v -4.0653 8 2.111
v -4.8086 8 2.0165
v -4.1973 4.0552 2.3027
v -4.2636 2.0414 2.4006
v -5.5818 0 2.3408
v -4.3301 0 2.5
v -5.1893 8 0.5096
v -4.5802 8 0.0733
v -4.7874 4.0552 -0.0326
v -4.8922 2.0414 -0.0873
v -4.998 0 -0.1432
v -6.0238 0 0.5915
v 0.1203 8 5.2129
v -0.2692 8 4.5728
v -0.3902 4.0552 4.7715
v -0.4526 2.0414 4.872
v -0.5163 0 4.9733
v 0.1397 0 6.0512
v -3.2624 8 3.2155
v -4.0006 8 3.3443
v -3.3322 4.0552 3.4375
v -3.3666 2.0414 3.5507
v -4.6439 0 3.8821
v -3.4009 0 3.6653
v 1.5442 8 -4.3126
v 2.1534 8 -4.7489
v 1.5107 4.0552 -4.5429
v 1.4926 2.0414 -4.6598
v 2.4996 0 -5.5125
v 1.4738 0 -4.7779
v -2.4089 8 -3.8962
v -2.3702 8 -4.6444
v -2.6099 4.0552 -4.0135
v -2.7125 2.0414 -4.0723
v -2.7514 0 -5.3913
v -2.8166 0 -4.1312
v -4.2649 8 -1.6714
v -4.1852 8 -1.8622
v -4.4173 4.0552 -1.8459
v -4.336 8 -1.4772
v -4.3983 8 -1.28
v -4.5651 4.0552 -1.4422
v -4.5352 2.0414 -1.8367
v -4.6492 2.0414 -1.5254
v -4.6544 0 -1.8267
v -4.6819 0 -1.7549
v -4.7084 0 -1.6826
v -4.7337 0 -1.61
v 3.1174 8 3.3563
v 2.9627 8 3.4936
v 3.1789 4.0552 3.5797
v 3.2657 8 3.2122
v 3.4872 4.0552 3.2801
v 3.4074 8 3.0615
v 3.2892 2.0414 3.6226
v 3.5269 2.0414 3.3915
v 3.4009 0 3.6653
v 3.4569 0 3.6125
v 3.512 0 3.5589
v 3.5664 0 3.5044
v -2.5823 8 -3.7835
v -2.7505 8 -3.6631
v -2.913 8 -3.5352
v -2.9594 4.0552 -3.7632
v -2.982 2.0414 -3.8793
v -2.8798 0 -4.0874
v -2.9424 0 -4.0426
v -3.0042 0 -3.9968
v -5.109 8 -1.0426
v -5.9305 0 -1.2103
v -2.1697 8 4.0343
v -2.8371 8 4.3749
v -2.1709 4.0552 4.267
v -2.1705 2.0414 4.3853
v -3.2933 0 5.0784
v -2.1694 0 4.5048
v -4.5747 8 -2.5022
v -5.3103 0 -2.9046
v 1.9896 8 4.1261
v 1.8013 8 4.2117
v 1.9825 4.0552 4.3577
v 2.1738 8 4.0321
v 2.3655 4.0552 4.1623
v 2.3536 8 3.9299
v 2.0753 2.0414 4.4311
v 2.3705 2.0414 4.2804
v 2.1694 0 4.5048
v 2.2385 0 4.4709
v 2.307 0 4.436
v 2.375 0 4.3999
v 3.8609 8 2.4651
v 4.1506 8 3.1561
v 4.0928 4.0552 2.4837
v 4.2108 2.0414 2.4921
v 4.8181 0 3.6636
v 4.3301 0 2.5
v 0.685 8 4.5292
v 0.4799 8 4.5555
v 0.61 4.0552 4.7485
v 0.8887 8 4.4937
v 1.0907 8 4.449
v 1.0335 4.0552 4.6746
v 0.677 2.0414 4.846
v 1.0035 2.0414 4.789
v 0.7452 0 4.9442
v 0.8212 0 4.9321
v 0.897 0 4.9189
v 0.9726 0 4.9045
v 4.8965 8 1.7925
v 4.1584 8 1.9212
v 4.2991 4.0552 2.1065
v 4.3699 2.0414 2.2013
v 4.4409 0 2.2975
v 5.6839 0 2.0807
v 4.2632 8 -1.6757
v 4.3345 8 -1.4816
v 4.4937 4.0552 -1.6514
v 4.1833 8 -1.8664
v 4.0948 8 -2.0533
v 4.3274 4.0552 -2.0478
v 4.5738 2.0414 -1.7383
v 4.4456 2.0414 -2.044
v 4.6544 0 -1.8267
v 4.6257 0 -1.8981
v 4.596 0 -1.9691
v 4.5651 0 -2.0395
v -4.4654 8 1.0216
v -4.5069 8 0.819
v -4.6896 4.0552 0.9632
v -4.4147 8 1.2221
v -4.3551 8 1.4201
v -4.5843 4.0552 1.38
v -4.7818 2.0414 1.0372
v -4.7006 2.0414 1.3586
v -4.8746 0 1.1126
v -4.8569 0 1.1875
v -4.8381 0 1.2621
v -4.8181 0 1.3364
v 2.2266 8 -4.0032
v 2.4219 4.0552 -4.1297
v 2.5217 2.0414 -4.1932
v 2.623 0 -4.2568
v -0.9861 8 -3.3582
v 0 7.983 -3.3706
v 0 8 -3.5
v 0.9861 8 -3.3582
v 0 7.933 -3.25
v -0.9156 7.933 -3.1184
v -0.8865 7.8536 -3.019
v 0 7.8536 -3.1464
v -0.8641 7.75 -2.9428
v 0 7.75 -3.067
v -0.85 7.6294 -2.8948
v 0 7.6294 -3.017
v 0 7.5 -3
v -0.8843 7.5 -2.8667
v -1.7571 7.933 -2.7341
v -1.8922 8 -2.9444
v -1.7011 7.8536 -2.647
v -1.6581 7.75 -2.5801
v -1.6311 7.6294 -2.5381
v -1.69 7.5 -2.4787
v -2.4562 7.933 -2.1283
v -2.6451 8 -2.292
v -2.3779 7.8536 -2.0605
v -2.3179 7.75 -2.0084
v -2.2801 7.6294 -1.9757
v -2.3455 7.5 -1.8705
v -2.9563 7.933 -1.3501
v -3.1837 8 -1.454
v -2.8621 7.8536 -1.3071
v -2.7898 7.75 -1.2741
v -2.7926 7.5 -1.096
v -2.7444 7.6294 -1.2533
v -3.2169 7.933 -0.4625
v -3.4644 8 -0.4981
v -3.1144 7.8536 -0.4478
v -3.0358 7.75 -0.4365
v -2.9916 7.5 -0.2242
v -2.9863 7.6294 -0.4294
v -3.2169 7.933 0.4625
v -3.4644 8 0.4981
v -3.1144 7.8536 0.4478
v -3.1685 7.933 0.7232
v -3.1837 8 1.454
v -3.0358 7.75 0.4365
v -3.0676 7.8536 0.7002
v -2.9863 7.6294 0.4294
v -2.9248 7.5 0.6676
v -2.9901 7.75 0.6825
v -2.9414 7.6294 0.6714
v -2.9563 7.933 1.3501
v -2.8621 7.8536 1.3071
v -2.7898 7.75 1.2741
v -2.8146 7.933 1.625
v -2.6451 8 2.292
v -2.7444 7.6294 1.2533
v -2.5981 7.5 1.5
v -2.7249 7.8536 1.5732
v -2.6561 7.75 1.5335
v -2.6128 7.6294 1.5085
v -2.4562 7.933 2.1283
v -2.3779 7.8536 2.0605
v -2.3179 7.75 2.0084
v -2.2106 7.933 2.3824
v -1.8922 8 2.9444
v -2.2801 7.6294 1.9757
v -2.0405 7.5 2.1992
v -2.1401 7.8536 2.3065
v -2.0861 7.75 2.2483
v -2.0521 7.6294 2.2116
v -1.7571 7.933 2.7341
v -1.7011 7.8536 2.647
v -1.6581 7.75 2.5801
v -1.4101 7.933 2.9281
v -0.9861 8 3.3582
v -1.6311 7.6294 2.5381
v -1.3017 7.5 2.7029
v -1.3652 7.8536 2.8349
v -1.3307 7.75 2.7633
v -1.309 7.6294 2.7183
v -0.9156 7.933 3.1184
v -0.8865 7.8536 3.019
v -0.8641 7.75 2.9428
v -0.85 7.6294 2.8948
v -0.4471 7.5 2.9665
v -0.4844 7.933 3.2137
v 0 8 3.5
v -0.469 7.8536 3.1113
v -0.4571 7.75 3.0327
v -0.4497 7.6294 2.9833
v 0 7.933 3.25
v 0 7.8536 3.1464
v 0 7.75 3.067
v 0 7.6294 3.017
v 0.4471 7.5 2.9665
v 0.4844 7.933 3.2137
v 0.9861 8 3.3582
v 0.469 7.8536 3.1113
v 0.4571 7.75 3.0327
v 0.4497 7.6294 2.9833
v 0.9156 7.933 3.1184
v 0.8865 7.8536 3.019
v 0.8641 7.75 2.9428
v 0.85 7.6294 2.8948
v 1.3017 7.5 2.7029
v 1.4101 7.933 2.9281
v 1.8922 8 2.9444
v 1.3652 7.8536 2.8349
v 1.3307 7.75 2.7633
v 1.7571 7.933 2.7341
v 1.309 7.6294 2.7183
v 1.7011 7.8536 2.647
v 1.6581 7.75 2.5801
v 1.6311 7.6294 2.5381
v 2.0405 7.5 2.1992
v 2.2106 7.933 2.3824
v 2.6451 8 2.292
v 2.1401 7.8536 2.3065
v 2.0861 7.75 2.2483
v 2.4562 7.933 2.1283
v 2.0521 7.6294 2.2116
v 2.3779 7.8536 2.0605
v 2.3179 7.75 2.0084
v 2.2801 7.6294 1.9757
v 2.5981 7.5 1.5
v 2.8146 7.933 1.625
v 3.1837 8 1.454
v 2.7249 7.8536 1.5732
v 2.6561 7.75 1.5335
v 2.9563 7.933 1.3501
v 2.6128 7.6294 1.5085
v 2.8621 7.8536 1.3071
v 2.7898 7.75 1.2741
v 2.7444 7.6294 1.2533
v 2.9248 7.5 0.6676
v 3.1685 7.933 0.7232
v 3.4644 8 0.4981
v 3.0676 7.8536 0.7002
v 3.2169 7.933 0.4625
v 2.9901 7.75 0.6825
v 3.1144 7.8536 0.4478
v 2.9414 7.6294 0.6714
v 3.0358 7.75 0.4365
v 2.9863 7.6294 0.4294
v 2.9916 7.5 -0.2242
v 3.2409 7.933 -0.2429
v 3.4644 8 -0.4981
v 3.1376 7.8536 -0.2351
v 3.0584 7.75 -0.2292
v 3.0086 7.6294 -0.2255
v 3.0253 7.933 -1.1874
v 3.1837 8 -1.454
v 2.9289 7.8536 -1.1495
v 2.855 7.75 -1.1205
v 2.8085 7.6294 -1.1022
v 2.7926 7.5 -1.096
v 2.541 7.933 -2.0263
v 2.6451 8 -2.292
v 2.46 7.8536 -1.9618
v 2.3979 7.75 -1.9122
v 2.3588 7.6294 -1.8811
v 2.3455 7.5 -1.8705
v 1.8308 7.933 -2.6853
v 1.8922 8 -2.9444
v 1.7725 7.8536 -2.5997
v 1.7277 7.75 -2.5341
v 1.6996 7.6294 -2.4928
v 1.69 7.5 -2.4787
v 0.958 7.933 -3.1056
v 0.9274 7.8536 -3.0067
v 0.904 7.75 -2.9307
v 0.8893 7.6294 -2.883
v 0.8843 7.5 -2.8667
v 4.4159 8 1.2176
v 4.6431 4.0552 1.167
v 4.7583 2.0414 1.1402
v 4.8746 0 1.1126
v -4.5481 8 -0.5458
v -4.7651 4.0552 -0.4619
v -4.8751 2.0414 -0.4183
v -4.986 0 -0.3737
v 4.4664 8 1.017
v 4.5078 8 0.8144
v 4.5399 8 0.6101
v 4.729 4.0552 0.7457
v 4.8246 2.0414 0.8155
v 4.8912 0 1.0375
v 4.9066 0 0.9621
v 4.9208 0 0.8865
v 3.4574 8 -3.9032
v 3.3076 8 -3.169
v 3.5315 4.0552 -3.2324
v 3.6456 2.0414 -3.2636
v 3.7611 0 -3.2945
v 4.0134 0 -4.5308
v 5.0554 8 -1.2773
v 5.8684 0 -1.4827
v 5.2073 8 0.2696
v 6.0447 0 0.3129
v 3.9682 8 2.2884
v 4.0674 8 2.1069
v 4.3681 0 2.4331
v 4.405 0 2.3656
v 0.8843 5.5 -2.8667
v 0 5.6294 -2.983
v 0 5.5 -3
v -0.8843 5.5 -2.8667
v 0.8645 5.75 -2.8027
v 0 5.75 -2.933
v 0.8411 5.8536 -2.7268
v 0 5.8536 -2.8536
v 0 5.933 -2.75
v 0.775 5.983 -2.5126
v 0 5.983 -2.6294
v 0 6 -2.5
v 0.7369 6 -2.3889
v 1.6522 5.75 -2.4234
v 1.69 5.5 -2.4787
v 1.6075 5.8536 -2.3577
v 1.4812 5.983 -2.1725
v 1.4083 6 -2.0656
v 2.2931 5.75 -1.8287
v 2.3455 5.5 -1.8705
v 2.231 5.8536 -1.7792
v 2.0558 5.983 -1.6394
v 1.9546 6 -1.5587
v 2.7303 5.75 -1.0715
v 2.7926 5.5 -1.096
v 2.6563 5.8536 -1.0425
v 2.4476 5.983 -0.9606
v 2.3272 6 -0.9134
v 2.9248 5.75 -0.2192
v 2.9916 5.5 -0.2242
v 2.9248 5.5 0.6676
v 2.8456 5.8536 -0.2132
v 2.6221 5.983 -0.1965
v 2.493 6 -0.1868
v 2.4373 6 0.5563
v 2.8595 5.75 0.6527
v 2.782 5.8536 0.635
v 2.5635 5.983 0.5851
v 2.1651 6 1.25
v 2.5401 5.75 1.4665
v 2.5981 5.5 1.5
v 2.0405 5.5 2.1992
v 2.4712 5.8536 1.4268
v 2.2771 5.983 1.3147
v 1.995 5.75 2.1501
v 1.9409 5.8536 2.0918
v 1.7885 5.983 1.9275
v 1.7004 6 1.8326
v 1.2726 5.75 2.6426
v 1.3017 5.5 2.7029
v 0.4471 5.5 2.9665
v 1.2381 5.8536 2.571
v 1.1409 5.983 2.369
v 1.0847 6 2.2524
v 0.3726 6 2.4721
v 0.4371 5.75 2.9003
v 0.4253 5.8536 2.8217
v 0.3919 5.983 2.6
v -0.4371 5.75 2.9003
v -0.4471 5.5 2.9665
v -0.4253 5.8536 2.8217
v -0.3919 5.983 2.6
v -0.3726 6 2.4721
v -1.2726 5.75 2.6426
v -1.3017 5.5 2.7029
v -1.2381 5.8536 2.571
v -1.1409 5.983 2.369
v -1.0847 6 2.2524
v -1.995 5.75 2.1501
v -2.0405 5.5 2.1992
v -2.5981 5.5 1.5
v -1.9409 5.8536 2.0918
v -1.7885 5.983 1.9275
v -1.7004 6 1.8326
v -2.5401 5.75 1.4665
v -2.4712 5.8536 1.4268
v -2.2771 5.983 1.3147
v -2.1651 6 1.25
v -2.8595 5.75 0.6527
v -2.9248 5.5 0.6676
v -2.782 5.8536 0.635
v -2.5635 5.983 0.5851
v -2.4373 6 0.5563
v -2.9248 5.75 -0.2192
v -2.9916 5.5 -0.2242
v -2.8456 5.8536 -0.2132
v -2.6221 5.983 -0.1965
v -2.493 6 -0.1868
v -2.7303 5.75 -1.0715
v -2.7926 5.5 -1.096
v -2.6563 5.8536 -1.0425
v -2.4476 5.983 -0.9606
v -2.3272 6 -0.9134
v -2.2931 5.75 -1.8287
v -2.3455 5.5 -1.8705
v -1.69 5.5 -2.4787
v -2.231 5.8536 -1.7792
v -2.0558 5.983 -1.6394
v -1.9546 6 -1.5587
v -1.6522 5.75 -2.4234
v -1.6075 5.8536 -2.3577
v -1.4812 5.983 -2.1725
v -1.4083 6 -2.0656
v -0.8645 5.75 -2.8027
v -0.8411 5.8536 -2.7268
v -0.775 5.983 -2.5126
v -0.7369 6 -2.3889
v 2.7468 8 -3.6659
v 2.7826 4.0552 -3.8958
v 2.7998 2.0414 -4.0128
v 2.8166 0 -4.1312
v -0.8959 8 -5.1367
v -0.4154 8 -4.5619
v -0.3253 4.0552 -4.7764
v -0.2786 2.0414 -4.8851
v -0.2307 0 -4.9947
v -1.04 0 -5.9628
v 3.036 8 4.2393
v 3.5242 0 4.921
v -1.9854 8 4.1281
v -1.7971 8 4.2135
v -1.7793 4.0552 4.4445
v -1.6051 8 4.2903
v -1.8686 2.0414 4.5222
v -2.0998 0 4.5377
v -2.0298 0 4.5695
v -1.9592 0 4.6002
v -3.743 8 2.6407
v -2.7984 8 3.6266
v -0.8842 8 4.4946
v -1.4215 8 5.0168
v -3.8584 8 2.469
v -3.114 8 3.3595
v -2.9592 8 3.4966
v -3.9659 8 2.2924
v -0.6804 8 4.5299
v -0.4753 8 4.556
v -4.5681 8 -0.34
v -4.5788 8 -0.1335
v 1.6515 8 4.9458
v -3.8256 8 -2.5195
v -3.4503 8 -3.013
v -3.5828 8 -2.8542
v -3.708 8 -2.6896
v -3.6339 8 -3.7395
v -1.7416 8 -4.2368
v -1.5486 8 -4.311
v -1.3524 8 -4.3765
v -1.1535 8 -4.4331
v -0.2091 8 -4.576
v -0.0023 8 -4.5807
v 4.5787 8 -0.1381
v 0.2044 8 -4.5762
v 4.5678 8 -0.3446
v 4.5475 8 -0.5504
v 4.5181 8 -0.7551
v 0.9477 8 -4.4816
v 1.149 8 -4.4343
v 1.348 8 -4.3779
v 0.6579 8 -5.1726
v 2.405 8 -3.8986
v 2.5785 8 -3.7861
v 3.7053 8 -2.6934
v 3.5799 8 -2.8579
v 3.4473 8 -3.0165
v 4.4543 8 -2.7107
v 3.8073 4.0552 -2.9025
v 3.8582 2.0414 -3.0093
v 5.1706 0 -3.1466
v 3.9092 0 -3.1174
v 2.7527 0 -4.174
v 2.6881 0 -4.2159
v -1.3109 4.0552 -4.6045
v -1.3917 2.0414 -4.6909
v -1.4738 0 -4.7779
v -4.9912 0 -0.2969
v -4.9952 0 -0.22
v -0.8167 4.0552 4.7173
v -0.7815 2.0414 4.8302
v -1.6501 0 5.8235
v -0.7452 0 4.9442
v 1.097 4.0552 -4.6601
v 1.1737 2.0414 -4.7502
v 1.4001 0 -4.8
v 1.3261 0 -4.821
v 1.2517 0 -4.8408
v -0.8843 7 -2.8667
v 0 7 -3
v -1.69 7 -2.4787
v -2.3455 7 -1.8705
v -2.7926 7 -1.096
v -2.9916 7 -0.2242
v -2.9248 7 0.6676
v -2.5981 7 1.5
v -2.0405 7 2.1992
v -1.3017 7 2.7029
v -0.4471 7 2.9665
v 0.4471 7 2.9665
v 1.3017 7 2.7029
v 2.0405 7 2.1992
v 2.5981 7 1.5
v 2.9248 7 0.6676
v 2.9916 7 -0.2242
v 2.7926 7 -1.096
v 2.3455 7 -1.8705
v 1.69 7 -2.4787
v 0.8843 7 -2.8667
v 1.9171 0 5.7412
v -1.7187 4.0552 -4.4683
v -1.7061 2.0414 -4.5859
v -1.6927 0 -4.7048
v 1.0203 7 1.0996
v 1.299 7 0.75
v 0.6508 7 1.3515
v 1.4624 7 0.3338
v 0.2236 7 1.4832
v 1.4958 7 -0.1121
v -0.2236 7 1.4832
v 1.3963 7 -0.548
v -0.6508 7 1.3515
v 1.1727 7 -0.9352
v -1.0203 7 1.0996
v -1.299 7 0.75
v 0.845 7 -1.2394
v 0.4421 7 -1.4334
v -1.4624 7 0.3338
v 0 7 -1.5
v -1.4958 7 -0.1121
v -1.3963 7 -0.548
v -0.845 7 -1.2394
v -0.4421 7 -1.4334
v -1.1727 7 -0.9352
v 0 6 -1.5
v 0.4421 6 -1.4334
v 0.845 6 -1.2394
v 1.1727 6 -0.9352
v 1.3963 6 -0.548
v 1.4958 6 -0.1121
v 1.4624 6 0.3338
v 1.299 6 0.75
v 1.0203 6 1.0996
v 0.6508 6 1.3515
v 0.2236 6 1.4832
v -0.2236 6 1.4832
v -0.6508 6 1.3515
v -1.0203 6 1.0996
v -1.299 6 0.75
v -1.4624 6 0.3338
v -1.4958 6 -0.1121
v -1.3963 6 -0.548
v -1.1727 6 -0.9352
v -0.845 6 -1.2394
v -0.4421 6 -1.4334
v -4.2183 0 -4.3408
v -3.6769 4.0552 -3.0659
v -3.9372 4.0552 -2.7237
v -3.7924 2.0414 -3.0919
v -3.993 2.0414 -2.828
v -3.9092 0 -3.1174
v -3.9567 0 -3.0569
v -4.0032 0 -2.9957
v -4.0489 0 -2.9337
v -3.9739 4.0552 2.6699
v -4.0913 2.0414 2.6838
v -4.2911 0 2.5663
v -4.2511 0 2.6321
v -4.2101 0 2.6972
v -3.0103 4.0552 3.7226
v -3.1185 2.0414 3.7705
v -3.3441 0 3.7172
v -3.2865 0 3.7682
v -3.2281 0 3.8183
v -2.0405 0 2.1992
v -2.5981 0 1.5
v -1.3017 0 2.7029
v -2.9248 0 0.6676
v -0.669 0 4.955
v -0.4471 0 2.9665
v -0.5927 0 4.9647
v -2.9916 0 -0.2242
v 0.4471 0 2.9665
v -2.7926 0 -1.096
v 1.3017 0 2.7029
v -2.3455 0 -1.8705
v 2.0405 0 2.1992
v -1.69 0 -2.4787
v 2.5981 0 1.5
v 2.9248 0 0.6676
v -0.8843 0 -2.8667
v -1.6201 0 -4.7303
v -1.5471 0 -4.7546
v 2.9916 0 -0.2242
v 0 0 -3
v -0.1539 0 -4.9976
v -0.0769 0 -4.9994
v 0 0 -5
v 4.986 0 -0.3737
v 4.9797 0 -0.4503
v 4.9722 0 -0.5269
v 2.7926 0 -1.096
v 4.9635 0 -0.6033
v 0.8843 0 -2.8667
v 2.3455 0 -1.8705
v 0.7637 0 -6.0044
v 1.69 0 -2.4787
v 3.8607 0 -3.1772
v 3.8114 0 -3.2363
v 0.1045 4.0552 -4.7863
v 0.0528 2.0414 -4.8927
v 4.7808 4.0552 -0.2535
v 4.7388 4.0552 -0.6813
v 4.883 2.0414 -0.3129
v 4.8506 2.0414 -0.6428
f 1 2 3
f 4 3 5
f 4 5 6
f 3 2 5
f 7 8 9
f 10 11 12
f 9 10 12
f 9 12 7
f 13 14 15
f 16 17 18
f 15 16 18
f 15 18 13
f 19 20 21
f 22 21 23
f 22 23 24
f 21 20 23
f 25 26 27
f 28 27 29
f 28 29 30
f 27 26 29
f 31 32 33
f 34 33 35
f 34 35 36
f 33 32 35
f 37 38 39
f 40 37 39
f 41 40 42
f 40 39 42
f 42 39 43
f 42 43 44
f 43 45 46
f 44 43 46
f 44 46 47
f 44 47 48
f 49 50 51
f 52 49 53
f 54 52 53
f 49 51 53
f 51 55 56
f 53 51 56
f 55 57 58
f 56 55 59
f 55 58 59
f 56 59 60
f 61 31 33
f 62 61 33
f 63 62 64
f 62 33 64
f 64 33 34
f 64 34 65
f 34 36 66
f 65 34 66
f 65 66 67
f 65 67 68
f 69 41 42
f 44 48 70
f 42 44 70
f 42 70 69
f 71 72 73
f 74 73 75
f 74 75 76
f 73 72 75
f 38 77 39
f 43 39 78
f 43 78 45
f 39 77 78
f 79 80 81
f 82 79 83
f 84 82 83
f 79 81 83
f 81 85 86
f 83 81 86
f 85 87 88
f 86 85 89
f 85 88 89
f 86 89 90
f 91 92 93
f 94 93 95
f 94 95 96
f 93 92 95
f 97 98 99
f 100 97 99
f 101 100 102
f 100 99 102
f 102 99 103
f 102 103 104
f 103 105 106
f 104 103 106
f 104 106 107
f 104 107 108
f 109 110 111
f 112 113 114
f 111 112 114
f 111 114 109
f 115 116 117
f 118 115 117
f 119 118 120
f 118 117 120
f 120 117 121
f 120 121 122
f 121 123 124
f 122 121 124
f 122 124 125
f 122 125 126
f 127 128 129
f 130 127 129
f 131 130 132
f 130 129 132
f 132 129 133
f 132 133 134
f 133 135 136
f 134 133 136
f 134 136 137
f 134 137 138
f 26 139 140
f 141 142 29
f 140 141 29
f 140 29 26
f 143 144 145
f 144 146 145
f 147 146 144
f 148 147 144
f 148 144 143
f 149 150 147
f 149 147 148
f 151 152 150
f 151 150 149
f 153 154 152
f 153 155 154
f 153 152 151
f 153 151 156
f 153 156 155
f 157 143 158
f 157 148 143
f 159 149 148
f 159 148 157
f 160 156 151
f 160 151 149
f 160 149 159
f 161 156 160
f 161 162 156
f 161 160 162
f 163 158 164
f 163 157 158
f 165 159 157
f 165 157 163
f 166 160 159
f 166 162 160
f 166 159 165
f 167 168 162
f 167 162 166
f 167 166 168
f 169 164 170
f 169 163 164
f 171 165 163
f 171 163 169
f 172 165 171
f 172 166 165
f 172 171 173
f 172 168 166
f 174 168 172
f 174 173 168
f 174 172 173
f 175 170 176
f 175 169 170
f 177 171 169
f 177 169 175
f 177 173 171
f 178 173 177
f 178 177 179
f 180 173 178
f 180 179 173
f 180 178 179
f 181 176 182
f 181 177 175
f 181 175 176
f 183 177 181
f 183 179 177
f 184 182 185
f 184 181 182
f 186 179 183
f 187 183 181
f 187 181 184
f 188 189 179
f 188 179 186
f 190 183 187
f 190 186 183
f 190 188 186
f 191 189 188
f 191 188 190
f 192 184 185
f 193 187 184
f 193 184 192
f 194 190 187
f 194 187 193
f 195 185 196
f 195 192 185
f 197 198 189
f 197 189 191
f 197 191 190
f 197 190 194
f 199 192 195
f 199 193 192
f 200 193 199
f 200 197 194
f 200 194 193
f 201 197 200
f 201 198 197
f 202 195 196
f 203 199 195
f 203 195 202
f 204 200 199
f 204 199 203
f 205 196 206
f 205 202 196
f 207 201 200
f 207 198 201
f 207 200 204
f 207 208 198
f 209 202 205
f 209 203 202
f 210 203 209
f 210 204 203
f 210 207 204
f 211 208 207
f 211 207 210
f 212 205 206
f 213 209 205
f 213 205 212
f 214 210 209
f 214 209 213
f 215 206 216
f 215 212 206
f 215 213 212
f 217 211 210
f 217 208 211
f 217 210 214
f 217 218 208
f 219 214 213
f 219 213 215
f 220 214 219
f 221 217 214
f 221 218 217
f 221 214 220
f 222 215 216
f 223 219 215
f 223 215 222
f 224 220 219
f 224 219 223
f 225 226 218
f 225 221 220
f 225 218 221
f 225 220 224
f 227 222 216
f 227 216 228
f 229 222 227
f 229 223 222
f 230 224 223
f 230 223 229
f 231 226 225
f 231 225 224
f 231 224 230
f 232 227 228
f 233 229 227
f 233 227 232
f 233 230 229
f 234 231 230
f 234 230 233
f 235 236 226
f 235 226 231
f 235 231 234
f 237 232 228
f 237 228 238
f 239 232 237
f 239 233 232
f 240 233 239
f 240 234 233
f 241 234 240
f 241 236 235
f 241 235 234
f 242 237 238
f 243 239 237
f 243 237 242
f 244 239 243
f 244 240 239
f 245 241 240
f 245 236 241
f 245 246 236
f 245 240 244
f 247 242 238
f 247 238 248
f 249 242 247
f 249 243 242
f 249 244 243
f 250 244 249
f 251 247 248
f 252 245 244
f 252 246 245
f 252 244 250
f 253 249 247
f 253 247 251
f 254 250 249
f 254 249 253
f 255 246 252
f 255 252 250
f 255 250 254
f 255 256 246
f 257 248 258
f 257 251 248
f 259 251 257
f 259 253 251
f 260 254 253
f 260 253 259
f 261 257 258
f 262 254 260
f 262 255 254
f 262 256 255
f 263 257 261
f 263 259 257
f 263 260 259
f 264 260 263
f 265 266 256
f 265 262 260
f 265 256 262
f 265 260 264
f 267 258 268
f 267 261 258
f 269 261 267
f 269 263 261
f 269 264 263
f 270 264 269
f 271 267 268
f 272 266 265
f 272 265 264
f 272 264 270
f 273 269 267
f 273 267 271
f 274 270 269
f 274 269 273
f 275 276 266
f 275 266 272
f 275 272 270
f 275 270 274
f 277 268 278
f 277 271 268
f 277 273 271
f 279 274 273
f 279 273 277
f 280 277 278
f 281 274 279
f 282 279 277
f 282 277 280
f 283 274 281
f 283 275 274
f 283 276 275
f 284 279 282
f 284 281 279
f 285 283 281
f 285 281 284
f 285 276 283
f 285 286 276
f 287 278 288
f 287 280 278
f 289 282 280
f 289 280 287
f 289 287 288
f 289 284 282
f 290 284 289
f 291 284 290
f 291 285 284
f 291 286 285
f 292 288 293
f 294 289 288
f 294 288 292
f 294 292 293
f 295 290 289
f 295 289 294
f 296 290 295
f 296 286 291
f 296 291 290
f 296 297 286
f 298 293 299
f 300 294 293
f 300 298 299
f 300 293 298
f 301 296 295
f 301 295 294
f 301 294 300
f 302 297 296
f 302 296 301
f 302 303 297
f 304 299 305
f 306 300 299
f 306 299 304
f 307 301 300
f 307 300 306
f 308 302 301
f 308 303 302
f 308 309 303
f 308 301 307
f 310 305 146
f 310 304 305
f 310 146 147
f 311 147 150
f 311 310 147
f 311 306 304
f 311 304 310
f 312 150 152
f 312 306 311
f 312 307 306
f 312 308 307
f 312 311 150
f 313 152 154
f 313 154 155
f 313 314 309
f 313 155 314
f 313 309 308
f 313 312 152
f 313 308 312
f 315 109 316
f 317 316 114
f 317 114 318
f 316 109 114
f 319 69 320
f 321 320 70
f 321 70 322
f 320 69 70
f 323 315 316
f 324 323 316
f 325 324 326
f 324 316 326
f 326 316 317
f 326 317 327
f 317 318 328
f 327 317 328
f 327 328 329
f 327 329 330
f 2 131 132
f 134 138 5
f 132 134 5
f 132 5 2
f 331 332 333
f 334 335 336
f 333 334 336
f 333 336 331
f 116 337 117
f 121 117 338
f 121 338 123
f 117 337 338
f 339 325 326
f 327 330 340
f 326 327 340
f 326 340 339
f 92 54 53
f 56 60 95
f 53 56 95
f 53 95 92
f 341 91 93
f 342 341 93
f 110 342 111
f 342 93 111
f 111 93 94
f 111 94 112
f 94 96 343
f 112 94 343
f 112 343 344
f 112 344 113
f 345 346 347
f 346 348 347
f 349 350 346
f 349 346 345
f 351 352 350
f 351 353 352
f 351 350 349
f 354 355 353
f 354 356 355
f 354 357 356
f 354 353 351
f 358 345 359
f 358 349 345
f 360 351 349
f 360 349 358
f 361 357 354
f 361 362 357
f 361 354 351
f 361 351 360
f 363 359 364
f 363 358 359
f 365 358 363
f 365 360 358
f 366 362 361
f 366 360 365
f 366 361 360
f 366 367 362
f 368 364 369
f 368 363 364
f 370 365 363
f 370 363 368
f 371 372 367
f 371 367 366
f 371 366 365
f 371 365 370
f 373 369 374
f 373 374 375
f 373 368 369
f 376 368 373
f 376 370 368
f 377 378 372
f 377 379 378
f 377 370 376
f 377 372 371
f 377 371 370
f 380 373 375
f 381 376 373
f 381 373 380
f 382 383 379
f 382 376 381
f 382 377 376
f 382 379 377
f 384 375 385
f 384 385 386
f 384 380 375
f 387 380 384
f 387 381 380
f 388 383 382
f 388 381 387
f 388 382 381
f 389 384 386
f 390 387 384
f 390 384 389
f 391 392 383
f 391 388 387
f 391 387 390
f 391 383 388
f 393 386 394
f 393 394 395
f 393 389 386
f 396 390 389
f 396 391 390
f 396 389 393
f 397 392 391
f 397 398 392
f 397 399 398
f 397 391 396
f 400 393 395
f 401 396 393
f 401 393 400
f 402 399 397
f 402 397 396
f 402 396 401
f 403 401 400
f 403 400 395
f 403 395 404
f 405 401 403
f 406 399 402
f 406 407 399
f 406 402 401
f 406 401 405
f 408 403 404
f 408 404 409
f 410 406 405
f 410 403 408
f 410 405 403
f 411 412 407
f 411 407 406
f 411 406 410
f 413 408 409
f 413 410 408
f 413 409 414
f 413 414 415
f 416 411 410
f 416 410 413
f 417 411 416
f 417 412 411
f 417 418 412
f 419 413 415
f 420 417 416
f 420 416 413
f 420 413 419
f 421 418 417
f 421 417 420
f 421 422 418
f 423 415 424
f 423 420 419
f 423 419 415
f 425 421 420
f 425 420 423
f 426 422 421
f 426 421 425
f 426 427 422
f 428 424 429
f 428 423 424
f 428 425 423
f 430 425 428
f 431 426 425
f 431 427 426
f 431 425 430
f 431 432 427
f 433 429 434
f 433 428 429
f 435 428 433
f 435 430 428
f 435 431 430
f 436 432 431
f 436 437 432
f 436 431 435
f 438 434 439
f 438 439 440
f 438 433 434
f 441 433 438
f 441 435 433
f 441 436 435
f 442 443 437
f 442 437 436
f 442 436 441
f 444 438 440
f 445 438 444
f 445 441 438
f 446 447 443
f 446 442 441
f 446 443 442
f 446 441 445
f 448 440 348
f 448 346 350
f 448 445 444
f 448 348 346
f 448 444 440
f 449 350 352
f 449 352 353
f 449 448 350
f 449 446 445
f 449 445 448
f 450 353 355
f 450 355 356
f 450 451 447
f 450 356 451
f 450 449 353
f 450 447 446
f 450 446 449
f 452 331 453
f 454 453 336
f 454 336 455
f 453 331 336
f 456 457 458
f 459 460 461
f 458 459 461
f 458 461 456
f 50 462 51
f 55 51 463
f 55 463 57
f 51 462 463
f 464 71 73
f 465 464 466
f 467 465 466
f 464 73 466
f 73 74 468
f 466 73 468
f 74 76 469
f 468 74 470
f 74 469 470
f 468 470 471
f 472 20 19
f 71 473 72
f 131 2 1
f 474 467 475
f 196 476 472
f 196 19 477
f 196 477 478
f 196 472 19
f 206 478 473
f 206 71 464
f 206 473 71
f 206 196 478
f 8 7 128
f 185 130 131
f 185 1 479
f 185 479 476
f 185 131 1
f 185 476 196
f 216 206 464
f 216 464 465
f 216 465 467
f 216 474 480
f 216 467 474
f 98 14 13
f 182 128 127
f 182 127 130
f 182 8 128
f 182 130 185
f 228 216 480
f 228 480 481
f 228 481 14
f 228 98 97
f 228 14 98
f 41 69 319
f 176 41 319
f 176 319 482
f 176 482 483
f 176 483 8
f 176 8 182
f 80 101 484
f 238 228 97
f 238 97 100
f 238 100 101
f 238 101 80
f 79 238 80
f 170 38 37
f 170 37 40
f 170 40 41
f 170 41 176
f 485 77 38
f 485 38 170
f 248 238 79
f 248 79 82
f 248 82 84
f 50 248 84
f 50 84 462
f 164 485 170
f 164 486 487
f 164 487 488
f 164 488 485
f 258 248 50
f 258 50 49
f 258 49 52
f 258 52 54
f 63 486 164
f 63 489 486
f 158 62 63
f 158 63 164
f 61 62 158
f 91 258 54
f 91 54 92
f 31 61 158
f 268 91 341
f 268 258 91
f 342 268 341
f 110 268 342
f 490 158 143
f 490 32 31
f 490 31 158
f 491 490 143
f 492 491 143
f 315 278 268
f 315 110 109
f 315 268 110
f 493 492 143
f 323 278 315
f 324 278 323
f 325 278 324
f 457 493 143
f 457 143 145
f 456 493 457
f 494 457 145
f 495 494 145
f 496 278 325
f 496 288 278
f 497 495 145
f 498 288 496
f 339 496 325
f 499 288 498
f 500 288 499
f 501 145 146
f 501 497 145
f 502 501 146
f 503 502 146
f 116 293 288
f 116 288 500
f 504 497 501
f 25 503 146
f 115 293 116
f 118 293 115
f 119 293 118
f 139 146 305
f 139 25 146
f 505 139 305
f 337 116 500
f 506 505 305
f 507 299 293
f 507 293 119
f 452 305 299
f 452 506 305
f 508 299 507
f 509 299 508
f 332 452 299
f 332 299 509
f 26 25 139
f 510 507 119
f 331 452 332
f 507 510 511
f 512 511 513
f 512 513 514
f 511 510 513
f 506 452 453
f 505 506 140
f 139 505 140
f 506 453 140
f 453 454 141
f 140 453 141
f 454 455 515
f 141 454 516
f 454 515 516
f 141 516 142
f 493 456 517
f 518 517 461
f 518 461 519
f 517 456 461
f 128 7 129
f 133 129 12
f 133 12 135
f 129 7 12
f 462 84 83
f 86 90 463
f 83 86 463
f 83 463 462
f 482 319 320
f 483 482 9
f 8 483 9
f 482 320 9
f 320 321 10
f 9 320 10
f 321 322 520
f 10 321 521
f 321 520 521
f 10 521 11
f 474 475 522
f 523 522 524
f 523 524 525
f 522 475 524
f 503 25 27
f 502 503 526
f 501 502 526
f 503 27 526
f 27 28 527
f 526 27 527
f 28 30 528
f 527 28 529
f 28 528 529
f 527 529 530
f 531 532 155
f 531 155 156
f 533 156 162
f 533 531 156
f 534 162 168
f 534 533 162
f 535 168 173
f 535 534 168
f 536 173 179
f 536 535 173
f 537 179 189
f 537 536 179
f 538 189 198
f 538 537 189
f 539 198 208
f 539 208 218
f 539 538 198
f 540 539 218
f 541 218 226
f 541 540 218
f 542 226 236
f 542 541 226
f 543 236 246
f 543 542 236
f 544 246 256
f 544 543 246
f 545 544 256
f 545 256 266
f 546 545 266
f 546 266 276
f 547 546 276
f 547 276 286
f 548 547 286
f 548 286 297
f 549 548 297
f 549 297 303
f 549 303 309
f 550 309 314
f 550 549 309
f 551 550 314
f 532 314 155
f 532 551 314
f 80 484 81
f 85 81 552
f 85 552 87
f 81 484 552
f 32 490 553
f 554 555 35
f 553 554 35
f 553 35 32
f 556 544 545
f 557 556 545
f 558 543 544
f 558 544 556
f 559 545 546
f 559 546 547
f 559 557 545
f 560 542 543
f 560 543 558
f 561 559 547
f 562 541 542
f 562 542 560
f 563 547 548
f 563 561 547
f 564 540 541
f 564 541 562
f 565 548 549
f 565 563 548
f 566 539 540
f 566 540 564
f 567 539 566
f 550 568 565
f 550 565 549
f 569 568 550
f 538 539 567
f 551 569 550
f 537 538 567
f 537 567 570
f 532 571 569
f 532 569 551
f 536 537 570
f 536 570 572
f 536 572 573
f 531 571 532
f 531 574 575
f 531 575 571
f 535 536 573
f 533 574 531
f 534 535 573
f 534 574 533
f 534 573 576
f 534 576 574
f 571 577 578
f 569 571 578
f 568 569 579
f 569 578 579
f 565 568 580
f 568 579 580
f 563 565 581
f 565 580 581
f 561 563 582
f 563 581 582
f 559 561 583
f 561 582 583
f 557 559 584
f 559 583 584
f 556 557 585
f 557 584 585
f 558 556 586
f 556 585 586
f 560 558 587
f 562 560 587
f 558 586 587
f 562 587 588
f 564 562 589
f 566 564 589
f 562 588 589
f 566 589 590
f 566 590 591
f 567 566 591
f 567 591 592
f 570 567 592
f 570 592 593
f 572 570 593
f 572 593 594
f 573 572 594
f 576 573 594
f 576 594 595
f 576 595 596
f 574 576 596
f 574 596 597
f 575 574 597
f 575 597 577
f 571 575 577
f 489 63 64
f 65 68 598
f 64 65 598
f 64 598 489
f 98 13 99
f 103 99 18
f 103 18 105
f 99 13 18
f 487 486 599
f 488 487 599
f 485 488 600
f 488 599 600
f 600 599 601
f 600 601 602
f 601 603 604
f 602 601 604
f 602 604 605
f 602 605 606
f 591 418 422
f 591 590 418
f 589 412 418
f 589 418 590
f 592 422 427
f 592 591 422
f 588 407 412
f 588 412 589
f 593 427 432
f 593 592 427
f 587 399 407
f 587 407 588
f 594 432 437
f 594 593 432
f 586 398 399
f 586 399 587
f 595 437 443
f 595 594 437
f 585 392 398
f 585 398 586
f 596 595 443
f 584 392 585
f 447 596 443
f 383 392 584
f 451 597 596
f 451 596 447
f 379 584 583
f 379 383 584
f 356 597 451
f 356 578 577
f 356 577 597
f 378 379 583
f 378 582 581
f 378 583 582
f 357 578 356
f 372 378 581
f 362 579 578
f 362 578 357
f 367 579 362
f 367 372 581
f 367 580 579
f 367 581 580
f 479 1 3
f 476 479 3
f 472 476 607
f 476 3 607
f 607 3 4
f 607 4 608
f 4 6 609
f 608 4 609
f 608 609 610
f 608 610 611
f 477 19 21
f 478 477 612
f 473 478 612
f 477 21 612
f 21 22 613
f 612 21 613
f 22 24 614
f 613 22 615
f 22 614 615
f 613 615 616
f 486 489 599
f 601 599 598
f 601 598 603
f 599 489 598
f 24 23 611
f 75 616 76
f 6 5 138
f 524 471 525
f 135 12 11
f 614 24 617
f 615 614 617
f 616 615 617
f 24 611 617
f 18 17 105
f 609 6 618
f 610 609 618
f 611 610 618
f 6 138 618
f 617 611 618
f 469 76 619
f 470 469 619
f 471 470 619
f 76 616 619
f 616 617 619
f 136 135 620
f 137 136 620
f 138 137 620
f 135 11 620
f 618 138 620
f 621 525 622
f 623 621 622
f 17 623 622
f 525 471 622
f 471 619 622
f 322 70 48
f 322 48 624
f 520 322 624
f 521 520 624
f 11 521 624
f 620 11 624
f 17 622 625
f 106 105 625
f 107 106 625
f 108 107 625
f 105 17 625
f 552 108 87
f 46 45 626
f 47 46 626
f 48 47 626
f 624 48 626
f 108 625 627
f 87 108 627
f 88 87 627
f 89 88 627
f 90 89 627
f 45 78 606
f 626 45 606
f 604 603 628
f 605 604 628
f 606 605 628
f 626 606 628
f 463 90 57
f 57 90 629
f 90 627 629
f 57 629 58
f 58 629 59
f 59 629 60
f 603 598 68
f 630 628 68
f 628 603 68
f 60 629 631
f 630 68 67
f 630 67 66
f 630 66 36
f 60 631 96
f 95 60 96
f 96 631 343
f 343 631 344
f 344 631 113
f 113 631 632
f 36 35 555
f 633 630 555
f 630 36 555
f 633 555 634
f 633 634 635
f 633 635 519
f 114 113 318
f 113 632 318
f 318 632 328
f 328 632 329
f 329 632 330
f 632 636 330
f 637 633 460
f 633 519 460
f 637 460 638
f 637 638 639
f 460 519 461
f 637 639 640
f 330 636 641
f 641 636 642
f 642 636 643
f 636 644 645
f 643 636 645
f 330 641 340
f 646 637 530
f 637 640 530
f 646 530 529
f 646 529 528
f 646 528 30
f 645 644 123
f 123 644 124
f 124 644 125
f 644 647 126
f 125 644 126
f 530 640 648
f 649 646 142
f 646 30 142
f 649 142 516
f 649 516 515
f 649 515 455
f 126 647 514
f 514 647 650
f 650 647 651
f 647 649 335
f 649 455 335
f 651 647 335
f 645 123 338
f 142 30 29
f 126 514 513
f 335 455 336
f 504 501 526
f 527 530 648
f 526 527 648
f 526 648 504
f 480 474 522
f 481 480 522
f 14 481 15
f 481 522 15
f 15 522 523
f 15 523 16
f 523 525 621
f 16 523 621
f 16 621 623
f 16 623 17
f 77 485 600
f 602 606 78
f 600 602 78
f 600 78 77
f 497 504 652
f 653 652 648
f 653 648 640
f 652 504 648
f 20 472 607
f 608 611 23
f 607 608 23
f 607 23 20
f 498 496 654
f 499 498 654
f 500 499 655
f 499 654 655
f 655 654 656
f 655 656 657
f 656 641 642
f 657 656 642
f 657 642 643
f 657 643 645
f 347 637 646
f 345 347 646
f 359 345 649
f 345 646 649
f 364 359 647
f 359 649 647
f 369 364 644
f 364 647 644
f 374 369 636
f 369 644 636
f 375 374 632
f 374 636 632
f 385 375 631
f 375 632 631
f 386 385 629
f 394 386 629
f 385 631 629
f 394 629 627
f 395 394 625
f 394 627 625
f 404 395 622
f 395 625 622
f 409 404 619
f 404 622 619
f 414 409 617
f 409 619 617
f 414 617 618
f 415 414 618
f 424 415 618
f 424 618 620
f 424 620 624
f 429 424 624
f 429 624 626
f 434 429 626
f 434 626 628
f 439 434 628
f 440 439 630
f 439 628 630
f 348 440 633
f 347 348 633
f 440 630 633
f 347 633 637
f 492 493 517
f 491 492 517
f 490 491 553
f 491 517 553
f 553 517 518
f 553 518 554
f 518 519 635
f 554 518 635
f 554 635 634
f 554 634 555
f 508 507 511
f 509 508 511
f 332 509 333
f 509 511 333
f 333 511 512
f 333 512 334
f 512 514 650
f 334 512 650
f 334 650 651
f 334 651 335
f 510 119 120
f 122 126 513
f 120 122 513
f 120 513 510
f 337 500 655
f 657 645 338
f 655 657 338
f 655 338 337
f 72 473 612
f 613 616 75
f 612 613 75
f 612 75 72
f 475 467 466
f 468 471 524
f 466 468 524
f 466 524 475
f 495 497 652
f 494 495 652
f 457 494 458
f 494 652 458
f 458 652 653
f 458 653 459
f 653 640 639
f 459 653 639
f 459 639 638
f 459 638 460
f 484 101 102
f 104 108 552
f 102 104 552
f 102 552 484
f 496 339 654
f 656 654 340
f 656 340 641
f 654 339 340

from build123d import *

# Parameters (mm, degrees)
BOSS_EXTRUDE1_DEPTH = 8
BOSS_EXTRUDE1_DRAFT = 3
SKETCH2_R           = 3
CUT_EXTRUDE1_DEPTH  = 6
SKETCH3_R           = 1.5
CUT_EXTRUDE2_DEPTH  = 6
FILLET3_R           = 0.5
CUT_EXTRUDE3_START  = -1
SKETCH4_R           = 3
CUT_EXTRUDE3_DEPTH  = 1
FILLET4_R           = 0.5


with BuildPart() as part:
    # Sketch1 → Boss-Extrude1 (with draft: the straight prism first)
    with BuildSketch(Plane(origin=(0, 0, 0), x_dir=(1, 0, 0), z_dir=(0, 1, 0))):
        with BuildLine():
            ThreePointArc((0, 5), (-0.115399429, 4.99866812), (-0.230737379, 4.994673189))
            Line((-0.230737379, 4.994673189), (-1.040018866, 5.962771522))
            Line((-1.040018866, 5.962771522), (-1.473775872, 4.777864029))
            ThreePointArc((-1.473775872, 4.777864029), (-1.58365585, 4.742576742), (-1.692692132, 4.704762837))
            Line((-1.692692132, 4.704762837), (-2.751371505, 5.391311371))
            Line((-2.751371505, 5.391311371), (-2.81660029, 4.131193872))
            ThreePointArc((-2.81660029, 4.131193872), (-2.911197498, 4.065086607), (-3.00424376, 3.99681366))
            Line((-3.00424376, 3.99681366), (-4.218252713, 4.340809546))
            Line((-4.218252713, 4.340809546), (-3.909157412, 3.117449009))
            ThreePointArc((-3.909157412, 3.117449009), (-3.980066474, 3.026395689), (-4.048855146, 2.93373005))
            Line((-4.048855146, 2.93373005), (-5.310323655, 2.904607743))
            Line((-5.310323655, 2.904607743), (-4.654368743, 1.826705122))
            ThreePointArc((-4.654368743, 1.826705122), (-4.695289077, 1.718796232), (-4.733707985, 1.60997165))
            Line((-4.733707985, 1.60997165), (-5.930549036, 1.210318796))
            Line((-5.930549036, 1.210318796), (-4.986018986, 0.373650468))
            ThreePointArc((-4.986018986, 0.373650468), (-4.99331464, 0.258474187), (-4.997950095, 0.143160204))
            Line((-4.997950095, 0.143160204), (-6.02381911, -0.591512288))
            Line((-6.02381911, -0.591512288), (-4.874639561, -1.11260467))
            ThreePointArc((-4.874639561, -1.11260467), (-4.847662285, -1.224814423), (-4.818102407, -1.336371654))
            Line((-4.818102407, -1.336371654), (-5.581846421, -2.340784909))
            Line((-5.581846421, -2.340784909), (-4.330127019, -2.5))
            ThreePointArc((-4.330127019, -2.5), (-4.271273862, -2.599272897), (-4.210145176, -2.697161026))
            Line((-4.210145176, -2.697161026), (-4.643902182, -3.882068519))
            Line((-4.643902182, -3.882068519), (-3.400863689, -3.665259359))
            ThreePointArc((-3.400863689, -3.665259359), (-3.315364013, -3.742774568), (-3.228098069, -3.818295805))
            Line((-3.228098069, -3.818295805), (-3.293326854, -5.078413304))
            Line((-3.293326854, -5.078413304), (-2.169418696, -4.50484434))
            ThreePointArc((-2.169418696, -4.50484434), (-2.064869521, -4.553714293), (-1.959220284, -4.600158245))
            Line((-1.959220284, -4.600158245), (-1.650124983, -5.823518782))
            Line((-1.650124983, -5.823518782), (-0.745211331, -4.944154131))
            ThreePointArc((-0.745211331, -4.944154131), (-0.630902312, -4.960036519), (-0.516257178, -4.973276438))
            Line((-0.516257178, -4.973276438), (0.139697734, -6.051179059))
            Line((0.139697734, -6.051179059), (0.745211331, -4.944154131))
            ThreePointArc((0.745211331, -4.944154131), (0.859123337, -4.925637734), (0.972577644, -4.904497194))
            Line((0.972577644, -4.904497194), (1.917107695, -5.741165522))
            Line((1.917107695, -5.741165522), (2.169418696, -4.50484434))
            ThreePointArc((2.169418696, -4.50484434), (2.272812107, -4.453574421), (2.374994674, -4.399931852))
            Line((2.374994674, -4.399931852), (3.524174223, -4.921024233))
            Line((3.524174223, -4.921024233), (3.400863689, -3.665259359))
            ThreePointArc((3.400863689, -3.665259359), (3.484551548, -3.585791476), (3.566383005, -3.504413255))
            Line((3.566383005, -3.504413255), (4.818102407, -3.663628346))
            Line((4.818102407, -3.663628346), (4.330127019, -2.5))
            ThreePointArc((4.330127019, -2.5), (4.386673291, -2.399395223), (4.440882555, -2.297512163))
            Line((4.440882555, -2.297512163), (5.683921048, -2.080703003))
            Line((5.683921048, -2.080703003), (4.874639561, -1.11260467))
            ThreePointArc((4.874639561, -1.11260467), (4.899019862, -0.999802174), (4.920790201, -0.886467032))
            Line((4.920790201, -0.886467032), (6.04469836, -0.312898067))
            Line((6.04469836, -0.312898067), (4.986018986, 0.373650468))
            ThreePointArc((4.986018986, 0.373650468), (4.97606702, 0.488627685), (4.963464044, 0.603344585))
            Line((4.963464044, 0.603344585), (5.868377696, 1.482709236))
            Line((5.868377696, 1.482709236), (4.654368743, 1.826705122))
            ThreePointArc((4.654368743, 1.826705122), (4.610968785, 1.933640831), (4.565112324, 2.039546388))
            Line((4.565112324, 2.039546388), (5.170625921, 3.146571316))
            Line((5.170625921, 3.146571316), (3.909157412, 3.117449009))
            ThreePointArc((3.909157412, 3.117449009), (3.836165739, 3.206841502), (3.761130341, 3.294525544))
            Line((3.761130341, 3.294525544), (4.013441342, 4.530846726))
            Line((4.013441342, 4.530846726), (2.81660029, 4.131193872))
            ThreePointArc((2.81660029, 4.131193872), (2.720502533, 4.195100234), (2.622955421, 4.256771647))
            Line((2.622955421, 4.256771647), (2.499644887, 5.512536521))
            Line((2.499644887, 5.512536521), (1.473775872, 4.777864029))
            ThreePointArc((1.473775872, 4.777864029), (1.363110737, 4.810605899), (1.251719402, 4.840784909))
            Line((1.251719402, 4.840784909), (0.763744014, 6.004413255))
            Line((0.763744014, 6.004413255), (0, 5))
        make_face()
    extrude(amount=BOSS_EXTRUDE1_DEPTH)
    # Boss-Extrude1: the draft: its side faces are tilted about the plane it starts from
    boss_extrude1_sides = [part.faces().sort_by_distance(p)[0] for p in [
        (4.867869122, 4, -2.593058852),
        (4.539891667, 4, -3.132010163),
        (3.836165739, 4, -3.206841502),
        (3.887285841, 4, -3.912686135),
        (3.415020816, 4, -4.331020299),
        (2.720502533, 4, -4.195100234),
        (2.561300154, 4, -4.884654084),
        (1.98671038, 4, -5.145200275),
        (1.363110737, 4, -4.810605899),
        (1.007731708, 4, -5.422599082),
        (0.381872007, 4, -5.502206628),
        (-0.115399429, 4, -4.99866812),
        (-0.635378122, 4, -5.478722355),
        (-1.256897369, 4, -5.370317775),
        (-1.58365585, 4, -4.742576742),
        (-2.222031818, 4, -5.048037104),
        (-2.783985898, 4, -4.761252621),
        (-2.911197498, 4, -4.065086607),
        (-3.611248236, 4, -4.168811603),
        (-4.063705062, 4, -3.729129278),
        (-3.980066474, 4, -3.026395689),
        (-4.679589401, 4, -2.919168896),
        (-4.982346199, 4, -2.365656432),
        (-4.695289077, 4, -1.718796232),
        (-5.332128511, 4, -1.410145223),
        (-5.458284011, 4, -0.791984632),
        (-4.99331464, 4, -0.258474187),
        (-5.510884603, 4, 0.224176042),
        (-5.449229336, 4, 0.852058479),
        (-4.847662285, 4, 1.224814423),
        (-5.199974414, 4, 1.838578282),
        (-4.95598672, 4, 2.420392455),
        (-4.271273862, 4, 2.599272897),
        (-4.427023679, 4, 3.289614773),
        (-4.022382935, 4, 3.773663939),
        (-3.315364013, 4, 3.742774568),
        (-3.260712462, 4, 4.448354555),
        (-2.731372775, 4, 4.791628822),
        (-2.064869521, 4, 4.553714293),
        (-1.804672633, 4, 5.211838513),
        (-1.197668157, 4, 5.383836456),
        (-0.630902312, 4, 4.960036519),
        (-0.188279722, 4, 5.512227748),
        (0.442454532, 4, 5.497666595),
        (0.859123337, 4, 4.925637734),
        (1.444842669, 4, 5.322831358),
        (2.043263195, 4, 5.123004931),
        (2.272812107, 4, 4.453574421),
        (2.949584449, 4, 4.660478042),
        (3.462518956, 4, 4.293141796),
        (3.484551548, 4, 3.585791476),
        (4.192242706, 4, 3.584020801),
        (4.574114713, 4, 3.081814173),
        (4.386673291, 4, 2.399395223),
        (5.062401801, 4, 2.189107583),
        (5.279280304, 4, 1.596653836),
        (4.899019862, 4, 0.999802174),
        (5.48274428, 4, 0.599682549),
        (5.515358673, 4, -0.030376201),
        (4.97606702, 4, -0.488627685),
        (5.41592087, 4, -1.043026911),
        (5.26137322, 4, -1.654707179),
        (4.610968785, 4, -1.933640831),
    ]]
    draft(boss_extrude1_sides, Plane(origin=(0, 0, 0), x_dir=(1, 0, 0), z_dir=(0, 1, 0)), BOSS_EXTRUDE1_DRAFT)

    # Sketch2 → Cut-Extrude1 (cut)
    with BuildSketch(Plane.XZ):
        with Locations(Location((0, 0, 0), (0, 0, 270))):
            Circle(SKETCH2_R)
    extrude(amount=-CUT_EXTRUDE1_DEPTH, mode=Mode.SUBTRACT)

    # Sketch3 → Cut-Extrude2 (cut)
    with BuildSketch(Plane.XZ.offset(-6)):
        with Locations(Location((0, 0, 0), (0, 0, 270))):
            Circle(SKETCH3_R)
    extrude(amount=-CUT_EXTRUDE2_DEPTH, mode=Mode.SUBTRACT)

    # Fillet3
    fillet3_edges = [part.edges().sort_by_distance(p)[0] for p in [
        (0, 6, 3),
    ]]
    fillet(fillet3_edges, radius=FILLET3_R)

    # Sketch4 → Cut-Extrude3 (cut)
    with BuildSketch(Plane(origin=(0, 8, 0), x_dir=(1, 0, 0), z_dir=(0, 1, 0)).offset(CUT_EXTRUDE3_START)):
        with Locations(Location((0, 0, 0), (0, 0, 90))):
            Circle(SKETCH4_R)
    extrude(amount=CUT_EXTRUDE3_DEPTH, mode=Mode.SUBTRACT)

    # Fillet4
    fillet4_edges = [part.edges().sort_by_distance(p)[0] for p in [
        (0, 8, 3),
    ]]
    fillet(fillet4_edges, radius=FILLET4_R)


solid = part.part
